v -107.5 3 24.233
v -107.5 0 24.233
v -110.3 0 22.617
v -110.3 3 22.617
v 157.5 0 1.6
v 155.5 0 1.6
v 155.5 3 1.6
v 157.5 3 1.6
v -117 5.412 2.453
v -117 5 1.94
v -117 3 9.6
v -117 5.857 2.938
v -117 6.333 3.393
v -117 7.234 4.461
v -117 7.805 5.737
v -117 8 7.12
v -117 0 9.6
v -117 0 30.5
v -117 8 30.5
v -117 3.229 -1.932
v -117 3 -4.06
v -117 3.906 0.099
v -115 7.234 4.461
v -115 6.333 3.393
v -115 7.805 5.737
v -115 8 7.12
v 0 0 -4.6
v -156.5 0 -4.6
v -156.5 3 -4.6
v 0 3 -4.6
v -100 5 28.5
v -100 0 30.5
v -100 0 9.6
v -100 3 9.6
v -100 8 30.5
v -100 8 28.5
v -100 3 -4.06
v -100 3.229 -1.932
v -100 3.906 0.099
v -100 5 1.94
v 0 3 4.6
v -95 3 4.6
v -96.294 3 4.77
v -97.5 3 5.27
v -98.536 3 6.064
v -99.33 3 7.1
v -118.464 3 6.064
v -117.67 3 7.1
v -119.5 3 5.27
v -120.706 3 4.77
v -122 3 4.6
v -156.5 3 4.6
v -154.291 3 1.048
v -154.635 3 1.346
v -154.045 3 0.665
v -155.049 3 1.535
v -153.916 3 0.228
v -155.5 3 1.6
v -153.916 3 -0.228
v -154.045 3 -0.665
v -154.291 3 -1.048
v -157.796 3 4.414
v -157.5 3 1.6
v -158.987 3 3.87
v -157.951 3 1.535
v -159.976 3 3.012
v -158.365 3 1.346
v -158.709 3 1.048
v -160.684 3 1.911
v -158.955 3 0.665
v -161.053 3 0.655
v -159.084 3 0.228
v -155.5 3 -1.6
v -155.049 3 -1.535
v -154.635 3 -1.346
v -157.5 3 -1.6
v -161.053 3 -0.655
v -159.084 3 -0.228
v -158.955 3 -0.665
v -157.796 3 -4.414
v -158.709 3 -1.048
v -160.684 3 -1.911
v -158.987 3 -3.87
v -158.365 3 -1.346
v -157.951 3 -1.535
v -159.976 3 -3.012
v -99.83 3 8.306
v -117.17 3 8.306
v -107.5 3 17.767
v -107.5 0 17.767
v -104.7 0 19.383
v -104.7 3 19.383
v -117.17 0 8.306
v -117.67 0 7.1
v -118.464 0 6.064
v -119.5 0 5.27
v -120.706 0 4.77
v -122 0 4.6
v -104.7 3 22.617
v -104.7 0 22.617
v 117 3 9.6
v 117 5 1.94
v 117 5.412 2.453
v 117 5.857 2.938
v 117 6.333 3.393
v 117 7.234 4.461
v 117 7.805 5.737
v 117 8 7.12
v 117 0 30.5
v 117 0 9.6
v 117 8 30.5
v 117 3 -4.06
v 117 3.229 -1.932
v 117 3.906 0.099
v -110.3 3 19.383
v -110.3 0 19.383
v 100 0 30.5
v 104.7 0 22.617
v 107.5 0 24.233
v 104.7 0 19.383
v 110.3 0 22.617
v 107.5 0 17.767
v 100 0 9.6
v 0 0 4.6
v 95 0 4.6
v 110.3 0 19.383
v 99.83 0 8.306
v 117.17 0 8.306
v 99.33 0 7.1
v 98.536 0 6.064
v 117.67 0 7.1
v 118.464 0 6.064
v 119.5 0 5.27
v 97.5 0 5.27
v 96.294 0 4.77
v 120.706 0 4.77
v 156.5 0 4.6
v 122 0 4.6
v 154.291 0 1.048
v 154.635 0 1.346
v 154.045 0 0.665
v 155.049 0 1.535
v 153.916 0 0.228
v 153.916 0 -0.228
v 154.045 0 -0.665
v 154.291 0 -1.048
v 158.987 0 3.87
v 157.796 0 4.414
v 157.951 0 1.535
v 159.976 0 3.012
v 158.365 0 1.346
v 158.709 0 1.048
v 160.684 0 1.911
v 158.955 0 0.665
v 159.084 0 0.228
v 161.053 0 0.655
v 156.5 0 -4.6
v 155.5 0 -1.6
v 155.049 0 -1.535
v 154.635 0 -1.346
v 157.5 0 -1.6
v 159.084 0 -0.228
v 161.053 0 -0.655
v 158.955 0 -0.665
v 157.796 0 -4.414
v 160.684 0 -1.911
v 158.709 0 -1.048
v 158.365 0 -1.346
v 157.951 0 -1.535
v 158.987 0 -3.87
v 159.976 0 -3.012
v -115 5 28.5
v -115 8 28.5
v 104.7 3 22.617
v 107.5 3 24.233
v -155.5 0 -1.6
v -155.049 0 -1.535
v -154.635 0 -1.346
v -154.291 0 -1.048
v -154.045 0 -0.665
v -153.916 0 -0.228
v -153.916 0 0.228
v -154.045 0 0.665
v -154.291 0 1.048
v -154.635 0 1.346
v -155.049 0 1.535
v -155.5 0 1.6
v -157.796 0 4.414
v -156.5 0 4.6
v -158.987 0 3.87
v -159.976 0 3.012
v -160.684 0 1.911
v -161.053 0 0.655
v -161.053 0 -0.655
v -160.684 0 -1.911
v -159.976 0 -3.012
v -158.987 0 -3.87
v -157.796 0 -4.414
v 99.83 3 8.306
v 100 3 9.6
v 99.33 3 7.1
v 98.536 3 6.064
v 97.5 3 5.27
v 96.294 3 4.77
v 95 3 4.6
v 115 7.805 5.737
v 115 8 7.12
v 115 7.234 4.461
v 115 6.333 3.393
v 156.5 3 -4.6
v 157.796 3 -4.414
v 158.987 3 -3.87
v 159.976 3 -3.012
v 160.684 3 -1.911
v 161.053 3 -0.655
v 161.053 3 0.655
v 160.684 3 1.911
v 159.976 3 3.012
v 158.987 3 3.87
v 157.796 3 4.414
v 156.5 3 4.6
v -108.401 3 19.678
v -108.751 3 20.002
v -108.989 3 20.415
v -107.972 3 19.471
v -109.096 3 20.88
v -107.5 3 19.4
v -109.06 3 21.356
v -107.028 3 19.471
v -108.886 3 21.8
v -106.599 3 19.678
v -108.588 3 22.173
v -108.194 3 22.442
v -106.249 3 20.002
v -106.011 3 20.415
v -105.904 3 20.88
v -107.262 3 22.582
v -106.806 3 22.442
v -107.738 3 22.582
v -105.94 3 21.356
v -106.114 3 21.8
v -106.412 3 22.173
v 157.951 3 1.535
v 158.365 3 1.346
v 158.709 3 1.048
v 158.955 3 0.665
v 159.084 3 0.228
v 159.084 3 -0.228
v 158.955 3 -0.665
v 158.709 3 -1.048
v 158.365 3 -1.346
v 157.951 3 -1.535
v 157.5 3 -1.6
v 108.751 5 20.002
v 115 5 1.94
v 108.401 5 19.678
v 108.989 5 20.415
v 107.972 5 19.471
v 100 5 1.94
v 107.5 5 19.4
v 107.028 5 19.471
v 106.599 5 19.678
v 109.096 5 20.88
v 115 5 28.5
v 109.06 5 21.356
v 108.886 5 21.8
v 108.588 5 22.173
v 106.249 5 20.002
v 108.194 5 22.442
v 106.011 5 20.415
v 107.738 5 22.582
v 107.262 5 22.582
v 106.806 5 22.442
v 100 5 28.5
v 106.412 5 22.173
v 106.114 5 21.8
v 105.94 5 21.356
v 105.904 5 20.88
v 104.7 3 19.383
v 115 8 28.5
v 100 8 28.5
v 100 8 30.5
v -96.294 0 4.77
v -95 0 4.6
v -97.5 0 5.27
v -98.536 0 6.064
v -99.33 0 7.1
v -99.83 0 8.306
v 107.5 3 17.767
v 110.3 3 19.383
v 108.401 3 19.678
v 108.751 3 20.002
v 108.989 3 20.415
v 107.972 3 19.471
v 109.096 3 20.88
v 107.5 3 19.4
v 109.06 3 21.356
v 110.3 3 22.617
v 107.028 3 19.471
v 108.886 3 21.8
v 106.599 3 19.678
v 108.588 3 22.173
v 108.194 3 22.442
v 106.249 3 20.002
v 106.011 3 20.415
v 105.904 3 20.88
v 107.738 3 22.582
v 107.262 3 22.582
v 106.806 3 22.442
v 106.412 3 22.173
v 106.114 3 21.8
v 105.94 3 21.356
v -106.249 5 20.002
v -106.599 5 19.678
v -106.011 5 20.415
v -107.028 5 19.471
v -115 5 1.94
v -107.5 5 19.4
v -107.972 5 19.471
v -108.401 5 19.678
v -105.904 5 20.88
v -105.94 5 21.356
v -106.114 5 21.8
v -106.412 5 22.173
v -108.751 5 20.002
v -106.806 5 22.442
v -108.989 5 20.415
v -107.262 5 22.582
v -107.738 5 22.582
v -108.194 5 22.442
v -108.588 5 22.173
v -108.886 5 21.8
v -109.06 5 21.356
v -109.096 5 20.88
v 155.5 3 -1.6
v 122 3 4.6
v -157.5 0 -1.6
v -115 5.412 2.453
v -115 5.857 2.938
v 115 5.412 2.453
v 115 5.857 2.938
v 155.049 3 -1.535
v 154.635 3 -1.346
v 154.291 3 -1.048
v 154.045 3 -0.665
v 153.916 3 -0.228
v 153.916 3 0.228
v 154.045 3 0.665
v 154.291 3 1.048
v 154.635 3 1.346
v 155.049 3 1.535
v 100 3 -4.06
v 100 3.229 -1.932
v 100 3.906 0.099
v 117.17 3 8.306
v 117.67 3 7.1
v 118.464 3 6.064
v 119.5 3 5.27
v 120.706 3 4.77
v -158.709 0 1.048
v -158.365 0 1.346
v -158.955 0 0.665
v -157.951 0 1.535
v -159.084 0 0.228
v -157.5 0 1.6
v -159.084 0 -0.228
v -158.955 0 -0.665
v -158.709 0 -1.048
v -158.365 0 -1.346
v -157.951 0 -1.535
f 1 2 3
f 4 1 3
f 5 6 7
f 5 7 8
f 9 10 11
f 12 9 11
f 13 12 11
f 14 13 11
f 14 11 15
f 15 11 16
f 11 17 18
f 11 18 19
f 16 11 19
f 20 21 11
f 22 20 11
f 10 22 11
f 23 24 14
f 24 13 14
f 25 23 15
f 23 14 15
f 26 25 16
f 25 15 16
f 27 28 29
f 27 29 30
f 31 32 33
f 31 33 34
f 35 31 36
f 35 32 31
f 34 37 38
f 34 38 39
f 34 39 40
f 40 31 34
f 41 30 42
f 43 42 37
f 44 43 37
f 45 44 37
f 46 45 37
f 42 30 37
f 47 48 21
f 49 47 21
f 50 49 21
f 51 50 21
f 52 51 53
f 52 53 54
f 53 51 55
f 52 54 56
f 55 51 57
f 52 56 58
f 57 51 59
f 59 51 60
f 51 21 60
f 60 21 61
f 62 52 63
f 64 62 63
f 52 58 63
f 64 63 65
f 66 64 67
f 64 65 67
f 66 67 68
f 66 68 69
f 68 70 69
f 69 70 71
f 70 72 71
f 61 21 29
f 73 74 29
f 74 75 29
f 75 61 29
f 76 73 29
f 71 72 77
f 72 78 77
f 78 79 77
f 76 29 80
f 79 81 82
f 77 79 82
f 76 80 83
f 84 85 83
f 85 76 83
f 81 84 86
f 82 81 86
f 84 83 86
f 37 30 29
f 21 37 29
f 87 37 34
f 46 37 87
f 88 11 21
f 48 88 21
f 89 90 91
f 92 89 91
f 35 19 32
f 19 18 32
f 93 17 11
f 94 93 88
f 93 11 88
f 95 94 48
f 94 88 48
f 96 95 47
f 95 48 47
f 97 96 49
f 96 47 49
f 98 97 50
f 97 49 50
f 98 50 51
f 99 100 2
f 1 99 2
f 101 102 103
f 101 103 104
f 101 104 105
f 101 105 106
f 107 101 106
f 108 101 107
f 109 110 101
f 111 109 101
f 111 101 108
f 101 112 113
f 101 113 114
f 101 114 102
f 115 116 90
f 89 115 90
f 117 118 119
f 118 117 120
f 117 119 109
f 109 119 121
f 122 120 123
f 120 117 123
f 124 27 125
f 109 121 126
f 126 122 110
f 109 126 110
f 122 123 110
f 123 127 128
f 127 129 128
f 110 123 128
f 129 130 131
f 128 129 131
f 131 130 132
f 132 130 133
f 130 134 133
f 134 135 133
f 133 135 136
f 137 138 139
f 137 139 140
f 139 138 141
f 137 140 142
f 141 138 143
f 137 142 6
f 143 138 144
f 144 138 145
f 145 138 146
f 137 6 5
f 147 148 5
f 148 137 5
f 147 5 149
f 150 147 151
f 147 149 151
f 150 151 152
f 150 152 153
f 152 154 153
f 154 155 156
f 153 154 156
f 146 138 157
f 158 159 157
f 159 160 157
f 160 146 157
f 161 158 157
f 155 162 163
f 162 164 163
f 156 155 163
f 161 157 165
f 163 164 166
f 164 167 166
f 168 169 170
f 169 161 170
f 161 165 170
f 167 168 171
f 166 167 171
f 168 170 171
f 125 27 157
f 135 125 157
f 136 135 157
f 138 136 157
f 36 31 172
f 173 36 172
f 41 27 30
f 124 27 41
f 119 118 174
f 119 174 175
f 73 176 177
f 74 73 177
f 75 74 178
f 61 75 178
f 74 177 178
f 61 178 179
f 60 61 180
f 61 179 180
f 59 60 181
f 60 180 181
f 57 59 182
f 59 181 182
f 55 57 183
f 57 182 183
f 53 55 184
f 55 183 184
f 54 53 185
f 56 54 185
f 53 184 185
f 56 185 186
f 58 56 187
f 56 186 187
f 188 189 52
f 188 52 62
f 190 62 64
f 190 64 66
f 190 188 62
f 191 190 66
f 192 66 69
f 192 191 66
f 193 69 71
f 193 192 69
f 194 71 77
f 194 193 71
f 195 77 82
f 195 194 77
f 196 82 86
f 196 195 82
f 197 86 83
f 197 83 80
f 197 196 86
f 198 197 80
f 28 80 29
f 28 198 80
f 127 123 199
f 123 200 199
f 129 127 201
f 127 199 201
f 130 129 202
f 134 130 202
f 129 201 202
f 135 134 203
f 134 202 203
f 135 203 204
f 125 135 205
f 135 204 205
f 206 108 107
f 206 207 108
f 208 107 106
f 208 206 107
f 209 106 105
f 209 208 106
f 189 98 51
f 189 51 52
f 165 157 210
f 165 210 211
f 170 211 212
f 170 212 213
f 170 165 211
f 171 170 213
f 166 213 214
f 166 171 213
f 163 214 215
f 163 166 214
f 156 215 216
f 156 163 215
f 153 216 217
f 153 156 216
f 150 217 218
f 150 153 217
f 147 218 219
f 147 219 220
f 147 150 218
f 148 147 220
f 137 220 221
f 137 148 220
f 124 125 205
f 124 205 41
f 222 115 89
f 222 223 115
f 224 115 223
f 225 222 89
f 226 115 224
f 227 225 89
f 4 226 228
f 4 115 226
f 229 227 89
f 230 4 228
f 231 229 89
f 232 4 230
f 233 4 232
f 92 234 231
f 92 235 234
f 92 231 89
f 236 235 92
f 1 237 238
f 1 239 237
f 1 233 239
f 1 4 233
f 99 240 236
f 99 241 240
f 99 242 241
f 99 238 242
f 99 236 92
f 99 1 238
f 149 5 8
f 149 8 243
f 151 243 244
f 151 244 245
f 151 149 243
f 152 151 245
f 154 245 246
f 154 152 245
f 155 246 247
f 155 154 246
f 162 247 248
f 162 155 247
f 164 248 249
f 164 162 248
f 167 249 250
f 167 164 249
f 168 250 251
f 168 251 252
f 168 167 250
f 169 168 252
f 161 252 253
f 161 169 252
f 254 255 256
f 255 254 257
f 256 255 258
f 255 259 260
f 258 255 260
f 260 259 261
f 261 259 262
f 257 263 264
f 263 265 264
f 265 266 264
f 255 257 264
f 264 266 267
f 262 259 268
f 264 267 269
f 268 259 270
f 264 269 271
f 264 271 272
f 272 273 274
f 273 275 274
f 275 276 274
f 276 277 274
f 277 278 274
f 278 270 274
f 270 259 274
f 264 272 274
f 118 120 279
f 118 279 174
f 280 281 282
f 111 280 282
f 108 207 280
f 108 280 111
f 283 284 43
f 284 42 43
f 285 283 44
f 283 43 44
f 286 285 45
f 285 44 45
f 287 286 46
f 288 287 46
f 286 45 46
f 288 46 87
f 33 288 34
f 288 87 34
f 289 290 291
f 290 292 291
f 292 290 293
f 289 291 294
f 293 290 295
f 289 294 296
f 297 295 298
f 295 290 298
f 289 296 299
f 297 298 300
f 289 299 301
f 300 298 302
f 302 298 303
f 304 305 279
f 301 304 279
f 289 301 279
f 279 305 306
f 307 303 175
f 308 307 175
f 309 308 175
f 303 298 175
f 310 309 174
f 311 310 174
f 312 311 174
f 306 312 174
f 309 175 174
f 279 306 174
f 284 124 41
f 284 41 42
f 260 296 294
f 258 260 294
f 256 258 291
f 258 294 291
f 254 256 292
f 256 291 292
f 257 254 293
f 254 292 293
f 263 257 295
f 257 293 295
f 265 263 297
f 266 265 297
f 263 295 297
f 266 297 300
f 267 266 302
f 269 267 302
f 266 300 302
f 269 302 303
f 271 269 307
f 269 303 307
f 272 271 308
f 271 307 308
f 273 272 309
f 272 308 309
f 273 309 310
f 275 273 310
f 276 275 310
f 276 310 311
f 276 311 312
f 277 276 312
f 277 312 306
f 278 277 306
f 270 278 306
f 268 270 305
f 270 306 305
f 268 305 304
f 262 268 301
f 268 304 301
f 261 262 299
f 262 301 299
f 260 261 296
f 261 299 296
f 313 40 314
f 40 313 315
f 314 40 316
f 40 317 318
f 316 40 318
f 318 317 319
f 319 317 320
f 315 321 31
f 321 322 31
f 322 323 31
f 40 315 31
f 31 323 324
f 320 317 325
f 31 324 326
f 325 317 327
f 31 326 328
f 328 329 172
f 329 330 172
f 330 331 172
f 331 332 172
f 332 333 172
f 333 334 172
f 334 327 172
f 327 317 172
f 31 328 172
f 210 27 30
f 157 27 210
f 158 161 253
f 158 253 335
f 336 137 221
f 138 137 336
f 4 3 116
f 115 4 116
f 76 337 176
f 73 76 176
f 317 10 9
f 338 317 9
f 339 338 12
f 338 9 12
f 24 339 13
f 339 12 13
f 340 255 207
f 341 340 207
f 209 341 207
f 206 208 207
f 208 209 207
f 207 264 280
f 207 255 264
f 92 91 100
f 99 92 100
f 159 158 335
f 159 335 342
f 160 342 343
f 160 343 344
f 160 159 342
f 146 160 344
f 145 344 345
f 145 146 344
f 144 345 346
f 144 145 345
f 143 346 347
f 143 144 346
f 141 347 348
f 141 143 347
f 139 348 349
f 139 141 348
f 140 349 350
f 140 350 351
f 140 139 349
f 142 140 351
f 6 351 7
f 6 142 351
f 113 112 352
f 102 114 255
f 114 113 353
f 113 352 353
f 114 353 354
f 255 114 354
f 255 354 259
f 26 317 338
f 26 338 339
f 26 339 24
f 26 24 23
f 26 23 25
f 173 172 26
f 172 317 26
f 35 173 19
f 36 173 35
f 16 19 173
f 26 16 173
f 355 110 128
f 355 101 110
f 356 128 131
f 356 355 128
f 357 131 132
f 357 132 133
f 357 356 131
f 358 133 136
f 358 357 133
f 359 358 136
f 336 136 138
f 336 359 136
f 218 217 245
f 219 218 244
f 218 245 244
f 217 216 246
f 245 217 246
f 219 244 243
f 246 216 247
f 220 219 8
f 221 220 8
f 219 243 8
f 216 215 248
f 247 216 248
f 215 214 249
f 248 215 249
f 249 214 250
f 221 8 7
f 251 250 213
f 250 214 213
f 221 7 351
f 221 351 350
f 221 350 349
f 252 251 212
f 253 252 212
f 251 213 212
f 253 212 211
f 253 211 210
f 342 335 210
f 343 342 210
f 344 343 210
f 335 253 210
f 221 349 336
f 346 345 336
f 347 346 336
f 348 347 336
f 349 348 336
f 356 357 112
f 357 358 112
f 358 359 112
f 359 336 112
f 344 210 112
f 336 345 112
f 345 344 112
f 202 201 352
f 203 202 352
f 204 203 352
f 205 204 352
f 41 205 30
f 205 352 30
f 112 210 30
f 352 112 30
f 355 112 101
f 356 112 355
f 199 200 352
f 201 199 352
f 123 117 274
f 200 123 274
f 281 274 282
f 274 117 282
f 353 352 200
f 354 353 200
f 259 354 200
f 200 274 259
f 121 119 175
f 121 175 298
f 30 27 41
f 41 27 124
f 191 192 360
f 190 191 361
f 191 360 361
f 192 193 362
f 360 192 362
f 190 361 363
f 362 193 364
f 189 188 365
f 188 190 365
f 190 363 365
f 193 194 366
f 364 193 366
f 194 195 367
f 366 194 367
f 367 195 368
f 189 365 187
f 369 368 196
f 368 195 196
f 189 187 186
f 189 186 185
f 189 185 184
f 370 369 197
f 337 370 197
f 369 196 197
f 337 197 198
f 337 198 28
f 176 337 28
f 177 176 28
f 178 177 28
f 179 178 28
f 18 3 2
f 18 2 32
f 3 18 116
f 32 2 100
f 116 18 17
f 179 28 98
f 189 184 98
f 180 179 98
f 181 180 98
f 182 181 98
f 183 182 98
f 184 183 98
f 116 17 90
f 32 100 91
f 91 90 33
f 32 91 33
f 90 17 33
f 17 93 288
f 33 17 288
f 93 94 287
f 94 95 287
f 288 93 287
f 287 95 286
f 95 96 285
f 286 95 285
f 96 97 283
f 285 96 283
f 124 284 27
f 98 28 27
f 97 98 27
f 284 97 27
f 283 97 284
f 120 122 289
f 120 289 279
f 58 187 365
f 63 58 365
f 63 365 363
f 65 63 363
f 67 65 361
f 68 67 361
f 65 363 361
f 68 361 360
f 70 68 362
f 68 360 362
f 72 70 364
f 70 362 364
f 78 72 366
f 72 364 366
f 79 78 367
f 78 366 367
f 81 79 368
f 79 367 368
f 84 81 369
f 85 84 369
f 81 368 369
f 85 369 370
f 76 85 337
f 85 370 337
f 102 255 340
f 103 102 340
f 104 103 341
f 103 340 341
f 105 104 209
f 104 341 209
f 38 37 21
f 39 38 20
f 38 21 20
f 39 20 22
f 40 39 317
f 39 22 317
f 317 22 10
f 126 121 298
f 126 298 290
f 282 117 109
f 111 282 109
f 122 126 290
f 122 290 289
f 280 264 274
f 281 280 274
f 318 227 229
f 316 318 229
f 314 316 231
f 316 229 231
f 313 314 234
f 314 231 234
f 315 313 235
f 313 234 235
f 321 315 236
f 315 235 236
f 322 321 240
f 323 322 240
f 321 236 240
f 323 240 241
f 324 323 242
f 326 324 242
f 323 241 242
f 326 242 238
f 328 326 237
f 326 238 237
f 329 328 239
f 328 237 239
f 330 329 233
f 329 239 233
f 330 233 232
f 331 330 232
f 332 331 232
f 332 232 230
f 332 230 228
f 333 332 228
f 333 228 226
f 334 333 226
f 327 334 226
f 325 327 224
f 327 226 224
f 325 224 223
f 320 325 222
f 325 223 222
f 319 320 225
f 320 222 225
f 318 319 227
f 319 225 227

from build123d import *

# Parameters (mm, degrees)
EXTRUDE_1_DEPTH     = 3
EXTRUDE_START       = -3
EXTRUDE_3_DEPTH     = 5
EXTRUDE_5_DEPTH     = 3
CUT_EXTRUDE_1_DEPTH = 3
SKETCH_7_R          = 1.6
CUT_EXTRUDE_2_DEPTH = 2
FILLET_START        = -117
FILLET_1_DEPTH      = 17
FILLET_START_2      = 100
FILLET_1_2_DEPTH    = 17
FILLET_1_3_DEPTH    = 2
FILLET_START_3      = 115
FILLET_1_4_DEPTH    = 2
FILLET_2_R          = 5
FILLET_3_R          = 5


with BuildPart() as part:
    # Эскиз1 → Бобышка-Вытянуть1 (new body)
    with BuildSketch(Plane(origin=(0, 0, 0), x_dir=(1, 0, 0), z_dir=(0, 1, 0))):
        with BuildLine():
            Line((-156.5, 4.6), (156.5, 4.6))
            ThreePointArc((156.5, 4.6), (161.1, 0), (156.5, -4.6))
            Line((156.5, -4.6), (-156.5, -4.6))
            ThreePointArc((-156.5, -4.6), (-161.1, 0), (-156.5, 4.6))
        make_face()
        with BuildLine():
            Line((-155.5, -1.6), (-157.5, -1.6))
            ThreePointArc((-157.5, -1.6), (-159.1, 0), (-157.5, 1.6))
            Line((-157.5, 1.6), (-155.5, 1.6))
            ThreePointArc((-155.5, 1.6), (-153.9, 0), (-155.5, -1.6))
        make_face(mode=Mode.SUBTRACT)
        with BuildLine():
            Line((155.5, -1.6), (157.5, -1.6))
            ThreePointArc((157.5, -1.6), (159.1, 0), (157.5, 1.6))
            Line((157.5, 1.6), (155.5, 1.6))
            ThreePointArc((155.5, 1.6), (153.9, 0), (155.5, -1.6))
        make_face(mode=Mode.SUBTRACT)
    extrude(amount=EXTRUDE_1_DEPTH)

    # Эскиз3 → Бобышка-Вытянуть3 (add)
    with BuildSketch(Plane(origin=(0, 3, 0), x_dir=(1, 0, 0), z_dir=(0, 1, 0)).offset(EXTRUDE_START)):
        Polygon((-117, -13.5), (-117, -30.5), (-100, -30.5), (-100, -4.6), (-117, -4.6), align=None)
        Polygon((117, -4.6), (100, -4.6), (100, -30.5), (117, -30.5), (117, -13.5), align=None)
    extrude(amount=EXTRUDE_3_DEPTH)

    # Эскиз5 → Бобышка-Вытянуть5 (add)
    with BuildSketch(Plane(origin=(0, 5, 0), x_dir=(1, 0, 0), z_dir=(0, 1, 0))):
        Polygon((-117, -4.6), (-117, -30.5), (-100, -30.5), (-100, -28.5), (-115, -28.5), (-115, -4.6), align=None)
        Polygon((117, -4.6), (115, -4.6), (115, -28.5), (100, -28.5), (100, -30.5), (117, -30.5), align=None)
    extrude(amount=EXTRUDE_5_DEPTH)

    # Эскиз6 → Вырез-Вытянуть1 (cut)
    with BuildSketch(Plane.XZ):
        Polygon((107.5, 17.766838493), (104.7, 19.383419246), (104.7, 22.616580754), (107.5, 24.233161507), (110.3, 22.616580754), (110.3, 19.383419246), align=None)
        Polygon((-107.5, 24.233161507), (-110.3, 22.616580754), (-110.3, 19.383419246), (-107.5, 17.766838493), (-104.7, 19.383419246), (-104.7, 22.616580754), align=None)
    extrude(amount=-CUT_EXTRUDE_1_DEPTH, mode=Mode.SUBTRACT)

    # Эскиз7 → Вырез-Вытянуть2 (cut)
    with BuildSketch(Plane.XZ.offset(-3)):
        with Locations(Location((-107.5, 21, 0), (0, 0, 270))):
            Circle(SKETCH_7_R)
        with Locations(Location((107.5, 21, 0), (0, 0, 270))):
            Circle(SKETCH_7_R)
    extrude(amount=-CUT_EXTRUDE_2_DEPTH, mode=Mode.SUBTRACT)

    # Скругление1: read off the stored shape, not the designer's step
    # Скругление1 outline → Скругление1 (add)
    with BuildSketch(Plane.YZ.offset(FILLET_START)):
        with BuildLine():
            Line((5, 1.939745962), (5, 4.6))
            Line((5, 4.6), (3, 4.6))
            Line((3, 4.6), (3, -4.060254038))
            ThreePointArc((3, -4.060254038), (3.513167019, -0.897976378), (5, 1.939745962))
        make_face()
    extrude(amount=FILLET_1_DEPTH)

    # Fillet 1 2 outline → Fillet 1 2 (add)
    with BuildSketch(Plane.YZ.offset(FILLET_START_2)):
        with BuildLine():
            Line((5, 1.939745962), (5, 4.6))
            Line((5, 4.6), (3, 4.6))
            Line((3, 4.6), (3, -4.060254038))
            ThreePointArc((3, -4.060254038), (3.513167019, -0.897976378), (5, 1.939745962))
        make_face()
    extrude(amount=FILLET_1_2_DEPTH)

    # Fillet 1 3 outline → Fillet 1 3 (add)
    with BuildSketch(Plane.YZ.offset(FILLET_START)):
        with BuildLine():
            Line((8, 4.6), (5, 4.6))
            Line((5, 4.6), (5, 1.939745962))
            ThreePointArc((5, 1.939745962), (6.365300467, 3.42177524), (8, 4.6))
        make_face()
    extrude(amount=FILLET_1_3_DEPTH)

    # Fillet 1 4 outline → Fillet 1 4 (add)
    with BuildSketch(Plane.YZ.offset(FILLET_START_3)):
        with BuildLine():
            Line((8, 4.6), (5, 4.6))
            Line((5, 4.6), (5, 1.939745962))
            ThreePointArc((5, 1.939745962), (6.365300467, 3.42177524), (8, 4.6))
        make_face()
    extrude(amount=FILLET_1_4_DEPTH)

    # Скругление2
    fillet_2_edges = [part.edges().sort_by_distance(p)[0] for p in [
        (117, 1.5, 4.6),
        (100, 1.5, 4.6),
        (-100, 1.5, 4.6),
        (-117, 1.5, 4.6),
    ]]
    fillet(fillet_2_edges, radius=FILLET_2_R)

    # Скругление3
    fillet_3_edges = [part.edges().sort_by_distance(p)[0] for p in [
        (-116, 8, 4.6),
        (116, 8, 4.6),
    ]]
    fillet(fillet_3_edges, radius=FILLET_3_R)


with BuildPart() as body_2:
    # Split Bodies 1: the piece on the far side of the plane
    add(part.part)
    split(bisect_by=Plane(origin=(0, 0, 0), x_dir=(0, 0, 1), z_dir=(1, 0, 0)), keep=Keep.BOTTOM)


with BuildPart() as part_1:
    add(part.part)

    # Split Bodies 1
    split(bisect_by=Plane(origin=(0, 0, 0), x_dir=(0, 0, 1), z_dir=(1, 0, 0)), keep=Keep.TOP)


solid = Compound([body_2.part, part_1.part])
